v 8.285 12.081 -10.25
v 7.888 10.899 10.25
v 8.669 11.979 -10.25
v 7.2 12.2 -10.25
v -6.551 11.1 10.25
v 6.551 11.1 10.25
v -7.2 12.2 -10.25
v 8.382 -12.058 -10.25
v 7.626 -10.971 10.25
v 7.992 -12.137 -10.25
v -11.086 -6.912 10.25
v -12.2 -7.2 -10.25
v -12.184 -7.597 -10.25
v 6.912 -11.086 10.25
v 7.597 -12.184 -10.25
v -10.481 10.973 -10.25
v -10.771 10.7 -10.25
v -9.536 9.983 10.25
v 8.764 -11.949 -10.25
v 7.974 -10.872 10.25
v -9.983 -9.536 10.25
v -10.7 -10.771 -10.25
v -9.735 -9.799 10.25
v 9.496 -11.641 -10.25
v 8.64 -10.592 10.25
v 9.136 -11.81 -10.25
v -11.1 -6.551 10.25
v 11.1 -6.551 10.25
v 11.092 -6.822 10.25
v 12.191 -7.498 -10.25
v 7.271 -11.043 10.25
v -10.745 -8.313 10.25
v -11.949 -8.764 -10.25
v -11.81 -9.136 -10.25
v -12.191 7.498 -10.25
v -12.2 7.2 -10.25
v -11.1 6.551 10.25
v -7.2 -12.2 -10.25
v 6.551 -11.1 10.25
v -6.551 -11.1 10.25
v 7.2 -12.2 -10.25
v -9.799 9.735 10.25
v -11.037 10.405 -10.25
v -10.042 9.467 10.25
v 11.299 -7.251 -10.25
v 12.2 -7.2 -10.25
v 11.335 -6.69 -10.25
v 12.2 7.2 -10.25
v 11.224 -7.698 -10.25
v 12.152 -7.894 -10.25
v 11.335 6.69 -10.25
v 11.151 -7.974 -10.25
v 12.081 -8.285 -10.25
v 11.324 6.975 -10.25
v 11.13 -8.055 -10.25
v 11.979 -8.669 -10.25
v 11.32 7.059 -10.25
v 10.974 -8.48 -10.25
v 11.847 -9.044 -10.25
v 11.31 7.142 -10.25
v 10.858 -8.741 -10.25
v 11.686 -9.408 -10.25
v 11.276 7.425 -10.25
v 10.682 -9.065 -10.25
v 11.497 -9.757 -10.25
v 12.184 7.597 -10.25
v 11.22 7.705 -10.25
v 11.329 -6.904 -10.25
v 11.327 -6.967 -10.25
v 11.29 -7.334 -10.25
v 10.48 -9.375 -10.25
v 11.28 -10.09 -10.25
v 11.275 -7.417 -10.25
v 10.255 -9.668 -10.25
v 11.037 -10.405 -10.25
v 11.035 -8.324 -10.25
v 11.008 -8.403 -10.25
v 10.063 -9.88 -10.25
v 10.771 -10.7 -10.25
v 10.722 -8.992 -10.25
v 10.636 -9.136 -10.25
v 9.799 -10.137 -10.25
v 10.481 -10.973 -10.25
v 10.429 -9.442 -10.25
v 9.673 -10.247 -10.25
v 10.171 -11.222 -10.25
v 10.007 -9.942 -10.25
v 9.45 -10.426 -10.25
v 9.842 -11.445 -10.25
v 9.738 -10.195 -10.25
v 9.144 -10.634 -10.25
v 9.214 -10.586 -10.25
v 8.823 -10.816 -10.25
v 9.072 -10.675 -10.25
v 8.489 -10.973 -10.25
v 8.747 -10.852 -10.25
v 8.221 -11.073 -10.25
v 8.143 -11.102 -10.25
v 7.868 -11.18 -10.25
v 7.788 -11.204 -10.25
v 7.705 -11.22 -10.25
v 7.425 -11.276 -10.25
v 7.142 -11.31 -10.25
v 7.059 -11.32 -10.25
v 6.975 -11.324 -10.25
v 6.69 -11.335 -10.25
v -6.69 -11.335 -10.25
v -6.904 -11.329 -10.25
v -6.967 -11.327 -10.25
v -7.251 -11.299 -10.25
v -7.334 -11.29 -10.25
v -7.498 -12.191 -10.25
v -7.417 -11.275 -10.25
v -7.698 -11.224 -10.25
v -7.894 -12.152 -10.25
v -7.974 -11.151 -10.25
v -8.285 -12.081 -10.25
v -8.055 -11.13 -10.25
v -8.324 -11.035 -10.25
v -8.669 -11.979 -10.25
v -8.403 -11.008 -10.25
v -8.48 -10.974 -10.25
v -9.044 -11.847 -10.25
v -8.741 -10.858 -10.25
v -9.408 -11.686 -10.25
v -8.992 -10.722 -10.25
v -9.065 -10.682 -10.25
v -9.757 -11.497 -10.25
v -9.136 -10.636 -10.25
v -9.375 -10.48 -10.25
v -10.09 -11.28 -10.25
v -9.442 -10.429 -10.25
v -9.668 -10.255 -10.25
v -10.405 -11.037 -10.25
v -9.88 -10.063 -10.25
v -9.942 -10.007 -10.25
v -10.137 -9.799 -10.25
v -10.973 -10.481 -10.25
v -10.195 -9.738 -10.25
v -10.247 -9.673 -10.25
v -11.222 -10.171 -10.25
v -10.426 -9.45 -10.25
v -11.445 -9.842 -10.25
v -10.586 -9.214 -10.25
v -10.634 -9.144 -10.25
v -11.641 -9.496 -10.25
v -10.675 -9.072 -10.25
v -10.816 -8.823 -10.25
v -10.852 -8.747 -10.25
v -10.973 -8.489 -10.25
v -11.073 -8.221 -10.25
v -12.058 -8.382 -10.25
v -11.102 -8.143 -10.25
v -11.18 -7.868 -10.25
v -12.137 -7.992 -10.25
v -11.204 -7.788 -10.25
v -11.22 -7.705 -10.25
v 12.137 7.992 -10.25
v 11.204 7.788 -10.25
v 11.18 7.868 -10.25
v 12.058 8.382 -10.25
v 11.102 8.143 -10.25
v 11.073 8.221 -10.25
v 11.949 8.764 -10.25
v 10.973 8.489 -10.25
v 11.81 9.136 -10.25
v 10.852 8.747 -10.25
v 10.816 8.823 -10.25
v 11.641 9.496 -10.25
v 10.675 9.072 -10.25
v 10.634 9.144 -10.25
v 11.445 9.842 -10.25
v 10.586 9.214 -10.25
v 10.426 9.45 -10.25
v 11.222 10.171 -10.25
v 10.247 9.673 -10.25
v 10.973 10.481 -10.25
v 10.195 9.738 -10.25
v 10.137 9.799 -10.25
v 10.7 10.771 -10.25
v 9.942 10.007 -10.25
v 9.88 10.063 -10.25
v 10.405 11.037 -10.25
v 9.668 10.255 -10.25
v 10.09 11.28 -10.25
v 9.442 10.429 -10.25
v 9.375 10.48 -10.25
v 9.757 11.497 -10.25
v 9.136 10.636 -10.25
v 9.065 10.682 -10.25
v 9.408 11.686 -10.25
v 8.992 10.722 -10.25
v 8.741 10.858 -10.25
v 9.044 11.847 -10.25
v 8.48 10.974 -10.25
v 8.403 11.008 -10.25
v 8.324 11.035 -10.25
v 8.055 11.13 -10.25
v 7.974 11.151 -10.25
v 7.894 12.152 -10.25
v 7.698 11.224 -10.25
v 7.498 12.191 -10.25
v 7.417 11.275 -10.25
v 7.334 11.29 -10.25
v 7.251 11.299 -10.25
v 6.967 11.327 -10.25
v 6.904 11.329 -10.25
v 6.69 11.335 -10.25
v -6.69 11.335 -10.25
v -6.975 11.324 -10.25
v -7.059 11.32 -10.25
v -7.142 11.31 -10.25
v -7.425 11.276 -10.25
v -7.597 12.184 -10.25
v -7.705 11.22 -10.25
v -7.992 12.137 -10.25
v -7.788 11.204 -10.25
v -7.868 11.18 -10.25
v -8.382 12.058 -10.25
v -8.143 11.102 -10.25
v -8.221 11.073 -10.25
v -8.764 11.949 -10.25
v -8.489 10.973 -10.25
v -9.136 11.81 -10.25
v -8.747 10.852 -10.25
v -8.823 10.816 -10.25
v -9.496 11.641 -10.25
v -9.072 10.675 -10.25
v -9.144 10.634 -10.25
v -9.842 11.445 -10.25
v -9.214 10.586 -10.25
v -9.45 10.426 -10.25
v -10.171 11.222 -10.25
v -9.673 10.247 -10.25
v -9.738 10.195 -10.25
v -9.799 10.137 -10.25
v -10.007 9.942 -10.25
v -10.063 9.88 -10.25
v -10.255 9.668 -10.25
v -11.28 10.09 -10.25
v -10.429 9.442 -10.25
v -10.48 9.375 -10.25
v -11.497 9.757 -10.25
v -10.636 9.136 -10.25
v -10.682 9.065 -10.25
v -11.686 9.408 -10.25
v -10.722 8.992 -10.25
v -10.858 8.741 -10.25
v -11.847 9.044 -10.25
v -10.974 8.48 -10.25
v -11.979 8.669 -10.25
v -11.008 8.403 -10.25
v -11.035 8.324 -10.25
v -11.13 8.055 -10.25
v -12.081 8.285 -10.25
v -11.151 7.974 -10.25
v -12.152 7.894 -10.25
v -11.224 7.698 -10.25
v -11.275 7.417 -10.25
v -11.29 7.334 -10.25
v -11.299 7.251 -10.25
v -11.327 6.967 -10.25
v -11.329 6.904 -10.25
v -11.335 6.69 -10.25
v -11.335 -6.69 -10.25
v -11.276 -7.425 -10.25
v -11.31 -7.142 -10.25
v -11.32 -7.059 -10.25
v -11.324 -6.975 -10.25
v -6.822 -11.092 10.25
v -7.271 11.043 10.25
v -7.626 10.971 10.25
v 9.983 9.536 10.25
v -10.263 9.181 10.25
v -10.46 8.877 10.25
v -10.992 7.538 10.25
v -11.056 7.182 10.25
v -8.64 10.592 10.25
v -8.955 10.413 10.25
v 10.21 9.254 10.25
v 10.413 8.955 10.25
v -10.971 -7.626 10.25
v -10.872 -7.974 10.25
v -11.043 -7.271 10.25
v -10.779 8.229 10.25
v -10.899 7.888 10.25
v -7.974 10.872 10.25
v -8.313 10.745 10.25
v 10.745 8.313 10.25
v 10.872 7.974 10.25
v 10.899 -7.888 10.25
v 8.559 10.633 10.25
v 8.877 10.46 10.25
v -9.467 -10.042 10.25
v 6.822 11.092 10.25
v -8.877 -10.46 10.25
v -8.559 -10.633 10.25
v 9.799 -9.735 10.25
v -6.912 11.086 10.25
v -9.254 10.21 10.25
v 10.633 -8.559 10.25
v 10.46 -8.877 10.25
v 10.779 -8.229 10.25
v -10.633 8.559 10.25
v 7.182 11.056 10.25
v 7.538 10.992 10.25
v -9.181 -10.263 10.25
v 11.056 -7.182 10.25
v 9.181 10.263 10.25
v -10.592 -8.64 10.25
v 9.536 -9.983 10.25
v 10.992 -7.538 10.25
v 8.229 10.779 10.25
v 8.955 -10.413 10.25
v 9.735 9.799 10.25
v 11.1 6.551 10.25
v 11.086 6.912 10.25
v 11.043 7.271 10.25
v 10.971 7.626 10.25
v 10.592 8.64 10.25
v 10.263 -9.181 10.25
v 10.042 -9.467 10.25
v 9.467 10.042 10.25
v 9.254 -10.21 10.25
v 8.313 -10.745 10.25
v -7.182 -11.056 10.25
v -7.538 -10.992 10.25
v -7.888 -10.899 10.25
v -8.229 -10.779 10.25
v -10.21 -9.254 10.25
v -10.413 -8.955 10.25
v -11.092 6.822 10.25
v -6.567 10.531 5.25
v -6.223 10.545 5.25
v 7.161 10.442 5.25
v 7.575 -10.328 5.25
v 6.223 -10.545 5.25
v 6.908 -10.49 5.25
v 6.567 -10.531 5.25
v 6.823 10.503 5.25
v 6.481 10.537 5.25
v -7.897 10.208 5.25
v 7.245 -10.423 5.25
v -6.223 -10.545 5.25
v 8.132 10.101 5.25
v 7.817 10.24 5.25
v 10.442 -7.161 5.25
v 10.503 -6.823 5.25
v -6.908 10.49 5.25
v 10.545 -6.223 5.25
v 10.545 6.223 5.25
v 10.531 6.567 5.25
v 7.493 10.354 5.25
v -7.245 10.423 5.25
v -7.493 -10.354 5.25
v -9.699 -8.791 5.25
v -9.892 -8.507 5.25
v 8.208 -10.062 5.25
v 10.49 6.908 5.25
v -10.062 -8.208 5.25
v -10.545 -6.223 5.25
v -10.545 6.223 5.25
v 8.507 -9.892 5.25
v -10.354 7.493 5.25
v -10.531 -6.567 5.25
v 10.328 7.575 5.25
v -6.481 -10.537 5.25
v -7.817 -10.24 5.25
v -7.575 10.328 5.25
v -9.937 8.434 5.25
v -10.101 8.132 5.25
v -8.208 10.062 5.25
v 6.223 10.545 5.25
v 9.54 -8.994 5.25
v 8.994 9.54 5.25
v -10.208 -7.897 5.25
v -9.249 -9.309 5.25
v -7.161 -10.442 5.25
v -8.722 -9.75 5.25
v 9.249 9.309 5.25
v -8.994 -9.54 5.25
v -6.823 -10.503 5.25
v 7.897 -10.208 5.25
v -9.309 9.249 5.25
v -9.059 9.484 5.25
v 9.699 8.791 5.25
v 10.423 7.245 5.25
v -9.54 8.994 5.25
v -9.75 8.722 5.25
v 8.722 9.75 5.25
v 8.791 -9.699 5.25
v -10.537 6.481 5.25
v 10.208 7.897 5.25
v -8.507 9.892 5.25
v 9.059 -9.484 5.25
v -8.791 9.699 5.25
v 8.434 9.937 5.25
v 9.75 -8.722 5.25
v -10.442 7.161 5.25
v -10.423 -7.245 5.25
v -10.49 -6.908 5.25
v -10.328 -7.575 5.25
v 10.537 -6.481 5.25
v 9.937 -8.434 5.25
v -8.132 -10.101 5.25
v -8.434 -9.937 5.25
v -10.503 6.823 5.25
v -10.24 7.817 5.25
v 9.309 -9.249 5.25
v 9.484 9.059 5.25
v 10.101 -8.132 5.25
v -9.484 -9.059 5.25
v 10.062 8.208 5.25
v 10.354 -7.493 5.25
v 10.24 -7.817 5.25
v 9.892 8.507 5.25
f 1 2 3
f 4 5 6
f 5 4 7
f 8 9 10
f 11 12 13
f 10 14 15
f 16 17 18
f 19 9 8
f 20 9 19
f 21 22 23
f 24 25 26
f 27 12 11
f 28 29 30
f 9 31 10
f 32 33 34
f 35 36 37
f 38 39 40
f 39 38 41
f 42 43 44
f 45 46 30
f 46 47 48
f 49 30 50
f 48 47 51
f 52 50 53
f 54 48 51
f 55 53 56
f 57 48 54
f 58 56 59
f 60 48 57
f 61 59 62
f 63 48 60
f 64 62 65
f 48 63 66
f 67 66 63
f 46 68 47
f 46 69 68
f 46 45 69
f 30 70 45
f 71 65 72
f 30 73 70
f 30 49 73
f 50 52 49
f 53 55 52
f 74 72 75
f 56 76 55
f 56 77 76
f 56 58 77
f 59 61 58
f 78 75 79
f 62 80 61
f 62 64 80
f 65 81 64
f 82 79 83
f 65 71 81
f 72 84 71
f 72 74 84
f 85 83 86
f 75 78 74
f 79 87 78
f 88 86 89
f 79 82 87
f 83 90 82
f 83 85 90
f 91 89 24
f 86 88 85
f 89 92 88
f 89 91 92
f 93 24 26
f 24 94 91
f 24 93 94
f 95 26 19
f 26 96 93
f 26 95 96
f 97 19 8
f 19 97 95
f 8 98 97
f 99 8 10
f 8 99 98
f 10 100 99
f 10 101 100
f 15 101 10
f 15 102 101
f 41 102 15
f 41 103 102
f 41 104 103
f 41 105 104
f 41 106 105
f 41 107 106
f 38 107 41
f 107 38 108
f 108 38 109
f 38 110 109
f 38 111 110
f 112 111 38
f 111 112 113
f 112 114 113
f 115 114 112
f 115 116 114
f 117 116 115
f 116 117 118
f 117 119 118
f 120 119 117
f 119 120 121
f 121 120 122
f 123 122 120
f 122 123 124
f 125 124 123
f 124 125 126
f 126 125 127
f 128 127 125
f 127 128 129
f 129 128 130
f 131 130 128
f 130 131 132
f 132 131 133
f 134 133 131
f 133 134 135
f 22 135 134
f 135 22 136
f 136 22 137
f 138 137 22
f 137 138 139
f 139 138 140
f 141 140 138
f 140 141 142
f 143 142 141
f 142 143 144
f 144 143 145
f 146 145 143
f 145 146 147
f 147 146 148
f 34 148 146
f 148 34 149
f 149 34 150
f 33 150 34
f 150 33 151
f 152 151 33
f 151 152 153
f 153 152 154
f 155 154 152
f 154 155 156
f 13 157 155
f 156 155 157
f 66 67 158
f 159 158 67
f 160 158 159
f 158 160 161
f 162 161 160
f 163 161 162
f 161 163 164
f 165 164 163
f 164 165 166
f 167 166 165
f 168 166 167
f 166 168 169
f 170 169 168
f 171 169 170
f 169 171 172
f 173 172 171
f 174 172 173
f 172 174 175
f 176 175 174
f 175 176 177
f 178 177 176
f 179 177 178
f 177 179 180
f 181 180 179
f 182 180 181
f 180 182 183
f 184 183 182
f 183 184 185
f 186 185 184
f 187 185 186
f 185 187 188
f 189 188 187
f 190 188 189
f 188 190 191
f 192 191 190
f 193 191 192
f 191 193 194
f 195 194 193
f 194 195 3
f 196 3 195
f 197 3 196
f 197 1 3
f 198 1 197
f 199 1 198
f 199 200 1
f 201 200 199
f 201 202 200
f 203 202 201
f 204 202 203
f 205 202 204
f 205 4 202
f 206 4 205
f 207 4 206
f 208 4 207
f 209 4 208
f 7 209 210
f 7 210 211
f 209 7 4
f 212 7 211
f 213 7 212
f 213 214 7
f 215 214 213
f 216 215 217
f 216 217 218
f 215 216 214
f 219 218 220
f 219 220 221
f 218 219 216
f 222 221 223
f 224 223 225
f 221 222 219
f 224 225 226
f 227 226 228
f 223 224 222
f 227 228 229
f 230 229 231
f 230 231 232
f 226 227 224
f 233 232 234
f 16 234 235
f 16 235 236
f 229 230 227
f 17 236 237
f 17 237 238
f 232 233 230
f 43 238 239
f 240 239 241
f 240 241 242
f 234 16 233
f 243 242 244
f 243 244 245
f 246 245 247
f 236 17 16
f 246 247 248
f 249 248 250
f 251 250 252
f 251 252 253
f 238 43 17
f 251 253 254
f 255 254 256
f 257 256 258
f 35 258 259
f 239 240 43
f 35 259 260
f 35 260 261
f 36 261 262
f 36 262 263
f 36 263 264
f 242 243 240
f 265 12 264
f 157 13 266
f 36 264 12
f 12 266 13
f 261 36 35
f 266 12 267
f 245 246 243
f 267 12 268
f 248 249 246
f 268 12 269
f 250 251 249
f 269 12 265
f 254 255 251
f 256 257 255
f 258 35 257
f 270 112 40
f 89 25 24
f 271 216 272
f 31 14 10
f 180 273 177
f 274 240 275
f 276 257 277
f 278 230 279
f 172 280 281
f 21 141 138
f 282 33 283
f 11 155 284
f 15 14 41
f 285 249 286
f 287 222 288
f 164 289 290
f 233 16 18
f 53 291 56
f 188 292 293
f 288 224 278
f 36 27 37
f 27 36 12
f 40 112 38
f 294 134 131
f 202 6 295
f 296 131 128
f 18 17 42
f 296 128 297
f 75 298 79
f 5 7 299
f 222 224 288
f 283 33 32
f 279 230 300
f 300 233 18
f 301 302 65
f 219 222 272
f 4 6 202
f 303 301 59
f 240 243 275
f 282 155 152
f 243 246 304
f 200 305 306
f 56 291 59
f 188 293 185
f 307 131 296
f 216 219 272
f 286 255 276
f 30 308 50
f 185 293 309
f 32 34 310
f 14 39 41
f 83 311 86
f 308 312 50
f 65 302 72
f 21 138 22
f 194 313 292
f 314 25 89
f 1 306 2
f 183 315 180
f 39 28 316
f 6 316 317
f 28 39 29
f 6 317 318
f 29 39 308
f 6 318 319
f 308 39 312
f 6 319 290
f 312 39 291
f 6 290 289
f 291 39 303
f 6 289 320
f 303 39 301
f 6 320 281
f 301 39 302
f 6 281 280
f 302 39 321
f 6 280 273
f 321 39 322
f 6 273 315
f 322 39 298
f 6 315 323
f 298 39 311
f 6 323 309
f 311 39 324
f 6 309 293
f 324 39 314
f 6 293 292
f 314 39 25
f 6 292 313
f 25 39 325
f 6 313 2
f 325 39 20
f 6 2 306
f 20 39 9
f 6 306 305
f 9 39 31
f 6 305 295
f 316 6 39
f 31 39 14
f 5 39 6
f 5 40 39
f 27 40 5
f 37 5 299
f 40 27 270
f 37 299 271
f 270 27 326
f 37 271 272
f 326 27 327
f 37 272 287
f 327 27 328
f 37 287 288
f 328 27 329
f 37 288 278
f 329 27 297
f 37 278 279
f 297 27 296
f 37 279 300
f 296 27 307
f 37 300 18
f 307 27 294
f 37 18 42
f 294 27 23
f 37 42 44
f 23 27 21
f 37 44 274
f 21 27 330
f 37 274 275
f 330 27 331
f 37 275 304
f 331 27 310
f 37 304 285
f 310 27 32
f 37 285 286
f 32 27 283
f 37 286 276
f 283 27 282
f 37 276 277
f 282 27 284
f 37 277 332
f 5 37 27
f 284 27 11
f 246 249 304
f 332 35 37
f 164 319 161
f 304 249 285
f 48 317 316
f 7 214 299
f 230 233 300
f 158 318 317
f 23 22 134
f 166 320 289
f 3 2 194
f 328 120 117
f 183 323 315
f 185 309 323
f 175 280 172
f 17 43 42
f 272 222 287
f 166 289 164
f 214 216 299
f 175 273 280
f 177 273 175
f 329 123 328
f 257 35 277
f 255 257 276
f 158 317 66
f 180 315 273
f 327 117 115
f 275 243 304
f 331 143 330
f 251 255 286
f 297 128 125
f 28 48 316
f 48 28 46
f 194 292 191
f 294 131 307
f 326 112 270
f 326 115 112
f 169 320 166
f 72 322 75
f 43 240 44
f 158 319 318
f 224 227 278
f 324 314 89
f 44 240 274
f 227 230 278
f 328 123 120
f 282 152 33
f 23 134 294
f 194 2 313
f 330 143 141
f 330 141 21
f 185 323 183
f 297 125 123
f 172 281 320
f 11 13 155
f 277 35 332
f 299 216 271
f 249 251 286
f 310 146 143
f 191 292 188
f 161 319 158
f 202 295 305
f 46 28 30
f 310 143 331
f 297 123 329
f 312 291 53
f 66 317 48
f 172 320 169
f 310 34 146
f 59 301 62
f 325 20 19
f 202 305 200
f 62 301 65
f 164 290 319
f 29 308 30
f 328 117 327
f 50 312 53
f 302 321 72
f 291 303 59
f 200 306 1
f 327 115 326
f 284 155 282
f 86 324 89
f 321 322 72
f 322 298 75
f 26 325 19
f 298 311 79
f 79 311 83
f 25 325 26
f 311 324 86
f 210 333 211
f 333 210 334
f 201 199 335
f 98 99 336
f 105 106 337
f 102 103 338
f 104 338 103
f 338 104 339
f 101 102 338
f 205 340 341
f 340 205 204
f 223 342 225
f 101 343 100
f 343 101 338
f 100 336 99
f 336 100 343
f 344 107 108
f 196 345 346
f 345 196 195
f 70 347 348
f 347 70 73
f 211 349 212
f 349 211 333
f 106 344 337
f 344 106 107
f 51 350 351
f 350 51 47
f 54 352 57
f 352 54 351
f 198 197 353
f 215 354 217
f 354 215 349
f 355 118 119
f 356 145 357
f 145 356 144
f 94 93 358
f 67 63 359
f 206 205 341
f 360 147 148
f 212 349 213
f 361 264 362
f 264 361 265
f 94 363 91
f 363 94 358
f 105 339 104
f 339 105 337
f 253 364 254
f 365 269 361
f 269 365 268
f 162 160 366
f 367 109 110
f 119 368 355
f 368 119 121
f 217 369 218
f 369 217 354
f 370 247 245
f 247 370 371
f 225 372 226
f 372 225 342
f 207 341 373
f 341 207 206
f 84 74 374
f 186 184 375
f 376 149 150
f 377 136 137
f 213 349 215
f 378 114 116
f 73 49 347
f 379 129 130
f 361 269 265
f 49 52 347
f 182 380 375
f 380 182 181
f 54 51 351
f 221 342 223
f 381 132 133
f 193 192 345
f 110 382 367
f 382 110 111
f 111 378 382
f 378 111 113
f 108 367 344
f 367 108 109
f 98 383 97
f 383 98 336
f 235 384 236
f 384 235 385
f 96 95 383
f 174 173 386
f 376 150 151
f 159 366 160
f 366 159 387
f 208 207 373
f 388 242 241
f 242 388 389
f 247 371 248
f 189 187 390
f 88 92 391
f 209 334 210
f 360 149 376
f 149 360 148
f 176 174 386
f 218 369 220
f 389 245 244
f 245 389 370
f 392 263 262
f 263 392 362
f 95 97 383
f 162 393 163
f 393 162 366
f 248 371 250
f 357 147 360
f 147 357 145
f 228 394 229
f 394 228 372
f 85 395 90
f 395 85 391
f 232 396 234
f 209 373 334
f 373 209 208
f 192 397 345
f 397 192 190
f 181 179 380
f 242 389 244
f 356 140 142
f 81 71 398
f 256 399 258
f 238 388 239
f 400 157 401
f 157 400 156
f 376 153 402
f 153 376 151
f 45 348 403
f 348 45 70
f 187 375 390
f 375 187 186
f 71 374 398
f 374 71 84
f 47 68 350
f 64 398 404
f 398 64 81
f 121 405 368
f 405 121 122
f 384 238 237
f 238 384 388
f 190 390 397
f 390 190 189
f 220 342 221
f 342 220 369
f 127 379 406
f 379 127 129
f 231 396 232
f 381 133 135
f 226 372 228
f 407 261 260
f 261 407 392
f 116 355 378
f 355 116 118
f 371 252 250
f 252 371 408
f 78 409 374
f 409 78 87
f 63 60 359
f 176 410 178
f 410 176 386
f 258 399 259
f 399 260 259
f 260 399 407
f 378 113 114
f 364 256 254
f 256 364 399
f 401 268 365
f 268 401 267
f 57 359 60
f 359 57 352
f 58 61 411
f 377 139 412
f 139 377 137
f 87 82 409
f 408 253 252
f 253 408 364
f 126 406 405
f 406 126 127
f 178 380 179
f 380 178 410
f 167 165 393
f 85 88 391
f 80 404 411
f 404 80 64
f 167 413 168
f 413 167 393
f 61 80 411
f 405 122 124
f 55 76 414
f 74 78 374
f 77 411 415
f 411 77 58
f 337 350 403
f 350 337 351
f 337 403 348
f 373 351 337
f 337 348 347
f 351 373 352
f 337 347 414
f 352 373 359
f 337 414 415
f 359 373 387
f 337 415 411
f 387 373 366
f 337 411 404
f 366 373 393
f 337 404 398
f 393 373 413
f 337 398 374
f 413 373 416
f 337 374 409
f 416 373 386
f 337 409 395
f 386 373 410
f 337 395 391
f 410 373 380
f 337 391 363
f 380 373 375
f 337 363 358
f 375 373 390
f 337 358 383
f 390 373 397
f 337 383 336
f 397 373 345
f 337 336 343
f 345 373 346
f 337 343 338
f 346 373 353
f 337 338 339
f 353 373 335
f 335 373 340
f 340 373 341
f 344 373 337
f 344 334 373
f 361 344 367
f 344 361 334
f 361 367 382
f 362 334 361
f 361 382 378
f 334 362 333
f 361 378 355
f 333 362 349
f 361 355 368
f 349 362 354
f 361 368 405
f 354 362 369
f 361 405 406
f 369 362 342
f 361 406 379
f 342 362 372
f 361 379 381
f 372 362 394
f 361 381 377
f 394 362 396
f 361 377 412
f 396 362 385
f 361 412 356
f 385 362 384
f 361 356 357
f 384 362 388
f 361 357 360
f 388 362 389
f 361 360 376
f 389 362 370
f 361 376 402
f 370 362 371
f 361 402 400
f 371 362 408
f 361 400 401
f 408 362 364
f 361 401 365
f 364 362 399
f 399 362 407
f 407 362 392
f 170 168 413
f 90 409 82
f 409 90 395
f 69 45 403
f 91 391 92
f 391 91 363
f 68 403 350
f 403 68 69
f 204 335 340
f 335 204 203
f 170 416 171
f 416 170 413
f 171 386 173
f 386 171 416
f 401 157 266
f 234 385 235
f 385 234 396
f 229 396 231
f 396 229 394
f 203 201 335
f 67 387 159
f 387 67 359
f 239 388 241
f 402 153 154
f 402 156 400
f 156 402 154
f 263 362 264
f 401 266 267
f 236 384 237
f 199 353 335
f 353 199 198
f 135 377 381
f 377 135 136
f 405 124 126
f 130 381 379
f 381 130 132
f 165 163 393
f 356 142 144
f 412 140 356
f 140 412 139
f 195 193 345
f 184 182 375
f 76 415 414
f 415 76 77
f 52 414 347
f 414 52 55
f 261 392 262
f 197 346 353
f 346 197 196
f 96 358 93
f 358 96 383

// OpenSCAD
// definitions
$fa = 1;
$fs = 0.4;

fillet = 5;

diff = 1.1;
a = 24.8-0.4;
b = a-2*diff;
h = 20.5;

d1 = 17.54;
d2 = 15.98;

// set up modules
module adapter() {
    linear_extrude(h, center = true, scale = b/a)
        offset(r = +fillet) offset(delta = -fillet) {
            square(a, center = true);
        }
}

// build model
difference() {
    adapter();

    scale([0.95, 0.95, 1])
    translate([0, 0, -5])
    adapter();
}
